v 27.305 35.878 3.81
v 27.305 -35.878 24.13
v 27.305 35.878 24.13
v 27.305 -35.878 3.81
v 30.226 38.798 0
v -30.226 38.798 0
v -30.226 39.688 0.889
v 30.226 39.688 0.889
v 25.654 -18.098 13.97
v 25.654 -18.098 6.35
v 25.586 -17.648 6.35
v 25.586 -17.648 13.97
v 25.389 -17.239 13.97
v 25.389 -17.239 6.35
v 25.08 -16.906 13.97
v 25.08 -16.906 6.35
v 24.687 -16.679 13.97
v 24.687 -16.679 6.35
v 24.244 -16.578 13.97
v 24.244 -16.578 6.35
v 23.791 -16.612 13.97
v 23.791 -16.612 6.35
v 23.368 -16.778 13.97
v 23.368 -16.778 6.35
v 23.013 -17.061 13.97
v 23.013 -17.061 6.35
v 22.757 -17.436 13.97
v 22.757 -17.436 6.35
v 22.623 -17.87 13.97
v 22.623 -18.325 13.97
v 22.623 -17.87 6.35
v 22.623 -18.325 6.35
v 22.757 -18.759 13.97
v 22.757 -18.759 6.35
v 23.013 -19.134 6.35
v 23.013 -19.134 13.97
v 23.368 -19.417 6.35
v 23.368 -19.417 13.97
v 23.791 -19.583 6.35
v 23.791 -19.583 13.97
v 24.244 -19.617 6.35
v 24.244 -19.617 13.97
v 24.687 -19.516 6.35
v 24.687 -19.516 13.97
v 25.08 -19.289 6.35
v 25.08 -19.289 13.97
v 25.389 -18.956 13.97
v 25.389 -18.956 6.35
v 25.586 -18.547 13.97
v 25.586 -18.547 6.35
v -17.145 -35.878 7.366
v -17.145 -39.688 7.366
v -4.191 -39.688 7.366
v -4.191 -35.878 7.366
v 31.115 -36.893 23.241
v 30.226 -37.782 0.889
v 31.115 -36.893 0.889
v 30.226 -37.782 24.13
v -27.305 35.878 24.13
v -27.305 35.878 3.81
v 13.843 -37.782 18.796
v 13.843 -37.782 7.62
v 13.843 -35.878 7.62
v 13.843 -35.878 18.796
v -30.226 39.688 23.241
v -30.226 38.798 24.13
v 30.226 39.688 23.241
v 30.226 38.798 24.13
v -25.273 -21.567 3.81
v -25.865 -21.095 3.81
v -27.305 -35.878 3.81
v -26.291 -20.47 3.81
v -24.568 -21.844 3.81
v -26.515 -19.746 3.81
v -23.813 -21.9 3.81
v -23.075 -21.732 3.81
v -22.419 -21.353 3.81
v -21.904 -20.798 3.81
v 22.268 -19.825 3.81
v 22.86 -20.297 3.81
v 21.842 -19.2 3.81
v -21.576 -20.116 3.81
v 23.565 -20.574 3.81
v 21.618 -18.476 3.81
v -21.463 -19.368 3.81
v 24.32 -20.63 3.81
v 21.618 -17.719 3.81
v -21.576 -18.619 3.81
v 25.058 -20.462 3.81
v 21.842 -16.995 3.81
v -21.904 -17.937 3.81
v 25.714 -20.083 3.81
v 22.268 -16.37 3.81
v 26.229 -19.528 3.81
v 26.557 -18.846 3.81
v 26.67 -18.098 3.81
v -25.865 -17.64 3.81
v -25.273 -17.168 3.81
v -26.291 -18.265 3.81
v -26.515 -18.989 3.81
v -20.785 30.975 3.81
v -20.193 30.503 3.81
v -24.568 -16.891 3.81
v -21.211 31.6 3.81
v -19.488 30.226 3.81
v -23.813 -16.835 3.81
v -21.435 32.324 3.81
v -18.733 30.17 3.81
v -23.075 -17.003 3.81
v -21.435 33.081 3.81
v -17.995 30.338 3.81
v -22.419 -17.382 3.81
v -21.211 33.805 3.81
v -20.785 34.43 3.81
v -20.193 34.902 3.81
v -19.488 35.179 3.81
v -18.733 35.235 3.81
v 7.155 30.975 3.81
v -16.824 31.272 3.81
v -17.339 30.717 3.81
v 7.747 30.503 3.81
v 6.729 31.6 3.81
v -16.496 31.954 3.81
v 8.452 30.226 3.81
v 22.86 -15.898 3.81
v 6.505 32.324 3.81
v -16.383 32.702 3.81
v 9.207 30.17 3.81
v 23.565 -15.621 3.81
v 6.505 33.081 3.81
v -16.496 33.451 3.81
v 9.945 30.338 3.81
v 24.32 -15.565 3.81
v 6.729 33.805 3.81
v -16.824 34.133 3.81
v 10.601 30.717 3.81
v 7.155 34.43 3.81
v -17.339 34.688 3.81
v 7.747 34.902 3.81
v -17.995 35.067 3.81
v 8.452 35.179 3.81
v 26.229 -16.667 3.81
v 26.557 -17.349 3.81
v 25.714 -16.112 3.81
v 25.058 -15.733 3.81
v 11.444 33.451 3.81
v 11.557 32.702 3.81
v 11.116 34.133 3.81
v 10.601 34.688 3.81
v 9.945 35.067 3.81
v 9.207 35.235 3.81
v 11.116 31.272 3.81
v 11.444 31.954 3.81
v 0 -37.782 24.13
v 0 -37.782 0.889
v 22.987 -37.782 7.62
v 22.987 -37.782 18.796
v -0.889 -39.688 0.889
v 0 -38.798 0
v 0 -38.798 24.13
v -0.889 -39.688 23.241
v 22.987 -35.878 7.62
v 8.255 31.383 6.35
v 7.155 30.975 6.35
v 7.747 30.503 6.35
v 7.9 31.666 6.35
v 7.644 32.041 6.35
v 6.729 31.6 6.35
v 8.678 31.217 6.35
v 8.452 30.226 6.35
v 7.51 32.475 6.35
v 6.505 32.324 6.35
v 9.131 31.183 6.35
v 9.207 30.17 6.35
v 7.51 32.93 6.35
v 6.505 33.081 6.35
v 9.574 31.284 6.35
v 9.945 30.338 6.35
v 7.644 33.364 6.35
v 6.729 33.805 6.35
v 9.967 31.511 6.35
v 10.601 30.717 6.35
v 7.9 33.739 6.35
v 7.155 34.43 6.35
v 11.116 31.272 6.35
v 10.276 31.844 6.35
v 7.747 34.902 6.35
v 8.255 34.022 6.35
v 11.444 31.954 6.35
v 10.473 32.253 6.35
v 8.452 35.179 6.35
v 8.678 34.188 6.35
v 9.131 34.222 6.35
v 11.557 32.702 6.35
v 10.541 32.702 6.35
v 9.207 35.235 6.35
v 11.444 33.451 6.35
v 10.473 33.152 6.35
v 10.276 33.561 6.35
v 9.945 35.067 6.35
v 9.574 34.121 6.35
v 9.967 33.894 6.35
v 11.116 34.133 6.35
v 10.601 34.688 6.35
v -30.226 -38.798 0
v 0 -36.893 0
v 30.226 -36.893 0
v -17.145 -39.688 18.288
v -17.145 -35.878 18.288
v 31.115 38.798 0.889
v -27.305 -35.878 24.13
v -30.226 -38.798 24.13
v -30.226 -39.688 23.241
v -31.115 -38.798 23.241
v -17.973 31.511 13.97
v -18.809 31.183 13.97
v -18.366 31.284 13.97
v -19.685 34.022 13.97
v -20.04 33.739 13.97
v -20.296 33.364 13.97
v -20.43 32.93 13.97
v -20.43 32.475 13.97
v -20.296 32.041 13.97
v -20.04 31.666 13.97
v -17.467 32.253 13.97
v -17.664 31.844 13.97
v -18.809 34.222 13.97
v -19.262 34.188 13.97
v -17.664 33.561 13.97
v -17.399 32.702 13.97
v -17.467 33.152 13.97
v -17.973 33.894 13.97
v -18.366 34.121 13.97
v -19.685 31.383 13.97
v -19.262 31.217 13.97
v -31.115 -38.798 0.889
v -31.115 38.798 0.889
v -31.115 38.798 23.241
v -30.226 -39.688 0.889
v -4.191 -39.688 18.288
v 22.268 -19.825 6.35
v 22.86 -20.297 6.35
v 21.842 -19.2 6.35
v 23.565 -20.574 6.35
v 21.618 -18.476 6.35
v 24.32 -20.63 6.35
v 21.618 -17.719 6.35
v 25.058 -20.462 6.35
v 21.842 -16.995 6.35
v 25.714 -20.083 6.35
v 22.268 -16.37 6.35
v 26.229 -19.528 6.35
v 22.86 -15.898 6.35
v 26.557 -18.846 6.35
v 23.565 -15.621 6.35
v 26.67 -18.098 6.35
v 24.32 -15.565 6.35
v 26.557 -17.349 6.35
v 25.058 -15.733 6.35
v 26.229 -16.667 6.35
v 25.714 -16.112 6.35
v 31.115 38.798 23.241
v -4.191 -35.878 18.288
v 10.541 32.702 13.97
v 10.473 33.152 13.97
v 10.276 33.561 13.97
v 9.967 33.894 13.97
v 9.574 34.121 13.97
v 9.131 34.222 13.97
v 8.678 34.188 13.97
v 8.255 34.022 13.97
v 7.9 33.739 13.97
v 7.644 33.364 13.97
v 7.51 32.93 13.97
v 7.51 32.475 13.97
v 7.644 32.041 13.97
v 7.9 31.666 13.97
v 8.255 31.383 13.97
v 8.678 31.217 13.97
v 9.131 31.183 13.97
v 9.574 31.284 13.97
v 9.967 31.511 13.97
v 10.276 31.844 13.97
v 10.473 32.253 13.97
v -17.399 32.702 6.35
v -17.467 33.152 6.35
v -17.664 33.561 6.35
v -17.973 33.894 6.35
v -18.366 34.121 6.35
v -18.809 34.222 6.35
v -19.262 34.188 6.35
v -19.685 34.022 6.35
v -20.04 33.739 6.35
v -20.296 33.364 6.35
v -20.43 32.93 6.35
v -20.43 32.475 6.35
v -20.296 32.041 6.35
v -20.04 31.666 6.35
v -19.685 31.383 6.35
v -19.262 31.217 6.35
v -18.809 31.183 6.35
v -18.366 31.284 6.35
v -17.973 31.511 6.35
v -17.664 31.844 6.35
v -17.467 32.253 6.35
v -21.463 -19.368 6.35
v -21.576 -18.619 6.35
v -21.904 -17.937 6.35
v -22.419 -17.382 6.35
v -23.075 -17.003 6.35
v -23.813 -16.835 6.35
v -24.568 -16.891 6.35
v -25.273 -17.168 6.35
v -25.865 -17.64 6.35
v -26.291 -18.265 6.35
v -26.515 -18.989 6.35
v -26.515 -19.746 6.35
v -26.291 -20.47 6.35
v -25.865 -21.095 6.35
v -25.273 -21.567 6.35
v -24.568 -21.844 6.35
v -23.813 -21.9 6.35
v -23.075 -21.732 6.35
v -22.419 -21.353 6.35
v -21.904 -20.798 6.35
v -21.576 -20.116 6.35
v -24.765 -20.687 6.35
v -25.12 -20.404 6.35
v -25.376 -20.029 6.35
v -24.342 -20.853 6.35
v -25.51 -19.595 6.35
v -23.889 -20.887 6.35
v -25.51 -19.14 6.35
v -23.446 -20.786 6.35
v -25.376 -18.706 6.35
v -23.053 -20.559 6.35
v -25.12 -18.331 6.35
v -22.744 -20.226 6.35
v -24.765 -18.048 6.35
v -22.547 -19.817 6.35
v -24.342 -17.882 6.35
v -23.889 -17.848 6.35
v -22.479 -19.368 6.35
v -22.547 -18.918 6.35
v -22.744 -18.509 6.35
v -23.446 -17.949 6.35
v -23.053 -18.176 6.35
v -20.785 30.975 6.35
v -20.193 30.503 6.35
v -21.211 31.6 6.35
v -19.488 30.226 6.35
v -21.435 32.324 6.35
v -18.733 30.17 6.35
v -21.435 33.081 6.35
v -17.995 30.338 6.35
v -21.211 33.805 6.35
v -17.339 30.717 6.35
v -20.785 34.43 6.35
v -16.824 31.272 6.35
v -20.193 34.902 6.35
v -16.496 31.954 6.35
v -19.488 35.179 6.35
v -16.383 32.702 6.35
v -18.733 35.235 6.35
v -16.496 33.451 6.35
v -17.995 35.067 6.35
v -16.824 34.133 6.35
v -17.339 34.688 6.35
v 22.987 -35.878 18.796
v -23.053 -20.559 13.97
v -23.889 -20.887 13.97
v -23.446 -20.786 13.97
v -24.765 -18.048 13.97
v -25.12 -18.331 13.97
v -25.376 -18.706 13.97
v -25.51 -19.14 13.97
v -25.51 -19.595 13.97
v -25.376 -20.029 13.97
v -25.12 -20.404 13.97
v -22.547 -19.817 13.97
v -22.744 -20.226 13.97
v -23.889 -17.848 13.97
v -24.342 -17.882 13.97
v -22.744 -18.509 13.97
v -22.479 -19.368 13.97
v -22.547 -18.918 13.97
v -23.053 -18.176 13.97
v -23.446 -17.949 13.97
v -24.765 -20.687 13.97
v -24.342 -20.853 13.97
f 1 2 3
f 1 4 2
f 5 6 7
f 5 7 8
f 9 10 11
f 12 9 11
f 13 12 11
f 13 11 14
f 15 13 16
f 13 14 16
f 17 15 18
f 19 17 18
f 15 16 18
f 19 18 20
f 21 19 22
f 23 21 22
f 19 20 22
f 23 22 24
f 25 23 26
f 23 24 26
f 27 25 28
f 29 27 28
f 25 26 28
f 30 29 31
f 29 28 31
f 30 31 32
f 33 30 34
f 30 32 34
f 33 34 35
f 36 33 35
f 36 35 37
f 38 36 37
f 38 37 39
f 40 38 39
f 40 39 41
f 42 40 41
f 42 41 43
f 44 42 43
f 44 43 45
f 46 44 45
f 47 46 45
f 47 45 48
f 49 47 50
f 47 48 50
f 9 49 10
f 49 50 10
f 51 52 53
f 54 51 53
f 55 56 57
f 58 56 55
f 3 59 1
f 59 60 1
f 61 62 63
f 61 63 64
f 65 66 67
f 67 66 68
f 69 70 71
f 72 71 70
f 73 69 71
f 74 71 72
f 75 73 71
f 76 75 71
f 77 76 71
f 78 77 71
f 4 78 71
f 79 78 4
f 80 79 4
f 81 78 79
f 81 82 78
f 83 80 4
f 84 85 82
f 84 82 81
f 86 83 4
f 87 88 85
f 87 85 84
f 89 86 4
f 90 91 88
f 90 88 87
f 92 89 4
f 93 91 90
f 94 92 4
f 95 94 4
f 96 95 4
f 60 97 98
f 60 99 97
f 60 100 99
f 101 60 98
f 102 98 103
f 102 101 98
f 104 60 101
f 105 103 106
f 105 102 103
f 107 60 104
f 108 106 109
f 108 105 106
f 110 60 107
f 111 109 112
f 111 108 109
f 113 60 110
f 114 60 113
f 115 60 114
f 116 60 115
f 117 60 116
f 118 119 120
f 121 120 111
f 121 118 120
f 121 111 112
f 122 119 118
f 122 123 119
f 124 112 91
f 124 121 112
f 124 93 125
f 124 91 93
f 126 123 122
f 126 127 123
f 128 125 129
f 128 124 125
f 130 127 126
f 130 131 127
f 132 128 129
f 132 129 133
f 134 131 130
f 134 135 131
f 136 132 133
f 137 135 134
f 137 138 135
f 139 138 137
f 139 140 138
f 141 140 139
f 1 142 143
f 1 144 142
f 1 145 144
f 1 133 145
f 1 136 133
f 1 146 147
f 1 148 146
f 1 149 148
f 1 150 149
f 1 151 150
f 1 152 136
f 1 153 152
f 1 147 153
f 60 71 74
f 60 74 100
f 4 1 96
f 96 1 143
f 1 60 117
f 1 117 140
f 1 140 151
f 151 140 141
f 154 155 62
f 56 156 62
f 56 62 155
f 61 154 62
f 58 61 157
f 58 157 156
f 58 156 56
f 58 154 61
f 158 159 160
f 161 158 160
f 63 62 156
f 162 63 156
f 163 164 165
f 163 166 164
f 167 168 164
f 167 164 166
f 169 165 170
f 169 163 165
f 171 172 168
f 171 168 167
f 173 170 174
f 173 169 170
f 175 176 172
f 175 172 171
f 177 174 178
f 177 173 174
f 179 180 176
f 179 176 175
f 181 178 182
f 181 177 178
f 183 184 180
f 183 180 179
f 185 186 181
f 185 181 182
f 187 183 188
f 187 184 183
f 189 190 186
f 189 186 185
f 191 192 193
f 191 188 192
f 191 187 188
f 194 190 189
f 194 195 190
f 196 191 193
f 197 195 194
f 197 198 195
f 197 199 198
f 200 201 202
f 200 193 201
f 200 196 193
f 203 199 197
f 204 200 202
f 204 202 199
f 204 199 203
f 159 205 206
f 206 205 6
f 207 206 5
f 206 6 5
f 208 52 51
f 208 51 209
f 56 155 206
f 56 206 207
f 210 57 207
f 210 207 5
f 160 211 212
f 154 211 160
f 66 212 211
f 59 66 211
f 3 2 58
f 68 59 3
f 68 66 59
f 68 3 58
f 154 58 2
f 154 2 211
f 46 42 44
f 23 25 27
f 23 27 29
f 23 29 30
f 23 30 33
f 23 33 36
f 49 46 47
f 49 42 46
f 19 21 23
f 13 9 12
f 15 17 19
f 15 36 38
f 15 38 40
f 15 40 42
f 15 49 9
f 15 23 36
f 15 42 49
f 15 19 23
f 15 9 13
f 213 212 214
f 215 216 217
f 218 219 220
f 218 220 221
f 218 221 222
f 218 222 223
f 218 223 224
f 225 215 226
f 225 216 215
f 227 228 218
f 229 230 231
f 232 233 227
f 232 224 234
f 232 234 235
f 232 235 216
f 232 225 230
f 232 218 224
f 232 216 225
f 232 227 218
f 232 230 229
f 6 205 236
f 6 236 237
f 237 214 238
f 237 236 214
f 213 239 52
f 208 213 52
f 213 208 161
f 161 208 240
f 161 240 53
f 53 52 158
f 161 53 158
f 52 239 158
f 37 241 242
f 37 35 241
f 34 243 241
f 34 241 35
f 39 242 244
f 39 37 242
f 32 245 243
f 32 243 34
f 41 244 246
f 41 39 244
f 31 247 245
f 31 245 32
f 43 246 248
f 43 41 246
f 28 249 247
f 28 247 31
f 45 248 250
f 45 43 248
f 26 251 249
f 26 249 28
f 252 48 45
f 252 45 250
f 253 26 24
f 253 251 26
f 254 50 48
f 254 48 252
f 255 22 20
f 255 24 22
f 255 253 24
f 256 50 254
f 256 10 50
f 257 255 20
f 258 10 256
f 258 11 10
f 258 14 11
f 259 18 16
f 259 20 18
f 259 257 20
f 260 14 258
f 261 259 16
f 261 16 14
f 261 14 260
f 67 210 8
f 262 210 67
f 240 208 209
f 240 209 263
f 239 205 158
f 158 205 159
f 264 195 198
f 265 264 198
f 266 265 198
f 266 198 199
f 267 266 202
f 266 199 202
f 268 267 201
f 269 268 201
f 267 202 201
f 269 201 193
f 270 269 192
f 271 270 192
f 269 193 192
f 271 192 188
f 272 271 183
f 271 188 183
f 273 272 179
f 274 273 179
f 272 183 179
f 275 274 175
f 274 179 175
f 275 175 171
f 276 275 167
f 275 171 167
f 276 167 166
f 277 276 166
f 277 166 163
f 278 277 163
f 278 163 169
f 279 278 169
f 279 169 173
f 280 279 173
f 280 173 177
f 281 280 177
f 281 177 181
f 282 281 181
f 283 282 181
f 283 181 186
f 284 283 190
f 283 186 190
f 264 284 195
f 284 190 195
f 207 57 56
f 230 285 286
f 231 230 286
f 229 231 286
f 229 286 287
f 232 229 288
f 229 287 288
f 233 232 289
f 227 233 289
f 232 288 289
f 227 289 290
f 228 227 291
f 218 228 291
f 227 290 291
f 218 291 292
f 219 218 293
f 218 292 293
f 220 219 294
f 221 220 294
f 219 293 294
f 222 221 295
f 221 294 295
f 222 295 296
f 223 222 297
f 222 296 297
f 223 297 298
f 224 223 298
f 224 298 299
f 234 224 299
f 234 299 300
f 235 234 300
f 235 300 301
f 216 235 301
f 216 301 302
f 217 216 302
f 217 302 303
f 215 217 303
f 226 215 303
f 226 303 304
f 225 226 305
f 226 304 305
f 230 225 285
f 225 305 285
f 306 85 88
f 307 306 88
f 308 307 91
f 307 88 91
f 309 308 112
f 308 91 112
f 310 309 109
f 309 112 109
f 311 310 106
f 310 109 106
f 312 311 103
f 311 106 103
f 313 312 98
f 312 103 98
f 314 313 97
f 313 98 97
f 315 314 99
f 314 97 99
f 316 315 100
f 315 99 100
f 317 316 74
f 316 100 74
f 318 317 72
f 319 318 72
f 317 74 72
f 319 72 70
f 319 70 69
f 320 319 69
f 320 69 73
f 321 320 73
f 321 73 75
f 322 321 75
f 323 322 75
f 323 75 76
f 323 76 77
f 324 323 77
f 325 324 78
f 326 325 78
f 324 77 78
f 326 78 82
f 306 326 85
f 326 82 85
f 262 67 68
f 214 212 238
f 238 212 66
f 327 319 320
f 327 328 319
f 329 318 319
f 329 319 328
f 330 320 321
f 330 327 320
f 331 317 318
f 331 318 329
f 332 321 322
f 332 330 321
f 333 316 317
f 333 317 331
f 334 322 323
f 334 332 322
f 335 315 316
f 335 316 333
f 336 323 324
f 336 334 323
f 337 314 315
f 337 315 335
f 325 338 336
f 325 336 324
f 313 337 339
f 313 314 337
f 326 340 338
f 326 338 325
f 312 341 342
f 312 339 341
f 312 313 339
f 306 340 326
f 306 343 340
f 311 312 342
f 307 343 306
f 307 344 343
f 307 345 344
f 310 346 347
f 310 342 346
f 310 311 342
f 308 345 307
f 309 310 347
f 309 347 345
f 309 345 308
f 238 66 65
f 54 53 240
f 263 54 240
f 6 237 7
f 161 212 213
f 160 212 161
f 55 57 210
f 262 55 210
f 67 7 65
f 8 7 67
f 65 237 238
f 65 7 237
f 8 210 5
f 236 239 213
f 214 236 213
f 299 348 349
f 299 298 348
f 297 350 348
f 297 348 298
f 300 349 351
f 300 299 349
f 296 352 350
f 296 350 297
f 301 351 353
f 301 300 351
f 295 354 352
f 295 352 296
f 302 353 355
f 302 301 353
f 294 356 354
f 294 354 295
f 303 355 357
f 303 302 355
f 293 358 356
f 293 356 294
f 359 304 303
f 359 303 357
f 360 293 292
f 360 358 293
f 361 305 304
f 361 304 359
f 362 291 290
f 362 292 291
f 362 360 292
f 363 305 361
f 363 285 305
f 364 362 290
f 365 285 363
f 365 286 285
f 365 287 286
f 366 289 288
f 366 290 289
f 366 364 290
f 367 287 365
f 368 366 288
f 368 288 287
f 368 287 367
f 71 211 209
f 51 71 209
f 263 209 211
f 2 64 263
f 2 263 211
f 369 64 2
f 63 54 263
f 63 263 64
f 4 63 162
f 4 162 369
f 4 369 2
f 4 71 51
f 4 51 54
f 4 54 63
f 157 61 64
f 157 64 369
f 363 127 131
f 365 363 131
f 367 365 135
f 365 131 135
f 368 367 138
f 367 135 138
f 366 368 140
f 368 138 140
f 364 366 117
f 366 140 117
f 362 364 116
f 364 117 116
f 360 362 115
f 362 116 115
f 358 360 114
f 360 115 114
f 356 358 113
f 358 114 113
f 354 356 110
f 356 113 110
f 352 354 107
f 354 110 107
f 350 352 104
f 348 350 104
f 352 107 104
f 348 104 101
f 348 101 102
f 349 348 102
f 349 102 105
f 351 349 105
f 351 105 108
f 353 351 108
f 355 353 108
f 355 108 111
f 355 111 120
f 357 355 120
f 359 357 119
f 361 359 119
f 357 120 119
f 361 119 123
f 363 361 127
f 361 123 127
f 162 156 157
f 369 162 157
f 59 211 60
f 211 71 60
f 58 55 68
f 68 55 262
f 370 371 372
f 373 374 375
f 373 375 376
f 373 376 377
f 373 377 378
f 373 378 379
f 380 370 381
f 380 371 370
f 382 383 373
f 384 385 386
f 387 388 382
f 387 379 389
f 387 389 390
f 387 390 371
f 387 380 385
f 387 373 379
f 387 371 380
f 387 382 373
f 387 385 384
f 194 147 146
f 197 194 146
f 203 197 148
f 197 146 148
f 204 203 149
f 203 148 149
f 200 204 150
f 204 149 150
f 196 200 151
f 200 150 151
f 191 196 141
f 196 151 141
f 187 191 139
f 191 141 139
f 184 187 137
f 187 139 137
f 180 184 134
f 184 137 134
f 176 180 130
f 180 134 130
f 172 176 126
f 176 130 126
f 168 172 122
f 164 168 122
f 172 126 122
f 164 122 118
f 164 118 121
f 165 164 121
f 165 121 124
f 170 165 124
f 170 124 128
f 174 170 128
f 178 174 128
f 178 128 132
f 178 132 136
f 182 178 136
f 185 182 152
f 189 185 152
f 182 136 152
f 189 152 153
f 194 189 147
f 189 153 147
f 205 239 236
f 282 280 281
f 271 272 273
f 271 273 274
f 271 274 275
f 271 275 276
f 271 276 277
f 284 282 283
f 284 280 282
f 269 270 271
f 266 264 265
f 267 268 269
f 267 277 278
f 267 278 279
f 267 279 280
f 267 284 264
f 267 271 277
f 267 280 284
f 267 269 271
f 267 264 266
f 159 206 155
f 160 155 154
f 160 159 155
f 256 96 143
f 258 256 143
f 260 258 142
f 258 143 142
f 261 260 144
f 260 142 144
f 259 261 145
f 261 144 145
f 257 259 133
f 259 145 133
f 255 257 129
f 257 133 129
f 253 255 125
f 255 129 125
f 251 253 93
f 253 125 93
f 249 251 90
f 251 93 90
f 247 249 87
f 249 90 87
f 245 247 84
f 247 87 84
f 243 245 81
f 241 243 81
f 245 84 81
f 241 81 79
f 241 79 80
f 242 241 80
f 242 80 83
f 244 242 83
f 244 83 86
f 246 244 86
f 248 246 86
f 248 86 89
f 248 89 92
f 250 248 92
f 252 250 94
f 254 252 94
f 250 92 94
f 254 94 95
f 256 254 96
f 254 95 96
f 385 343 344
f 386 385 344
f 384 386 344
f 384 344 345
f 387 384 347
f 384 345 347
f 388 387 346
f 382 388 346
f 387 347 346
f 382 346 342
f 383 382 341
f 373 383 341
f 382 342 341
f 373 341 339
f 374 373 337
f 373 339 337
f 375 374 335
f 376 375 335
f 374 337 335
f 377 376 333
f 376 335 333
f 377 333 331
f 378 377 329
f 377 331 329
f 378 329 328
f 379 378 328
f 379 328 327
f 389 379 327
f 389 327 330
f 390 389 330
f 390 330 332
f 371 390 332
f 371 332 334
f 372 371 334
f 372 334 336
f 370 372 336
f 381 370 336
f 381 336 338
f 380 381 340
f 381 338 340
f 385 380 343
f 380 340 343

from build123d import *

# Parameters (mm, degrees)
F0_W      = 62.23
F0_H      = 79.375
F1_DEPTH  = 24.13
F2_T      = -3.81
F4_R      = 2.54
F5_DEPTH  = 2.54
F7_R      = 1.524
F8_DEPTH  = 7.62
F9_W      = 12.954
F9_H      = 10.922
F9_W_2    = 9.144
F9_H_2    = 11.176
F10_DEPTH = 3.81
F11_W     = 31.115
F11_H     = 24.13
F12_DEPTH = 1.905
F13_SIZE  = 0.889


with BuildPart() as f1:
    # F0 (on Top) → F1 (new body)
    with BuildSketch(Plane.XY):
        Rectangle(F0_W, F0_H)
    extrude(amount=F1_DEPTH)

    # F2
    f2_openings = [f1.faces().sort_by_distance(p)[0] for p in [
        (0, 0, 24.13),
    ]]
    offset(amount=F2_T, openings=f2_openings)

    # F4 (on face) → F5 (join)
    with BuildSketch(Plane.XY.offset(3.81)):
        with Locations((9.017, 32.7025)):
            Circle(F4_R)
        with Locations((-18.923, 32.7025)):
            Circle(F4_R)
        with Locations((-24.003, -19.3675)):
            Circle(F4_R)
        with Locations((24.13, -18.0975)):
            Circle(F4_R)
    extrude(amount=F5_DEPTH)

    # F7 (on offset) → F8 (join)
    with BuildSketch(Plane.XY.offset(6.35)):
        with Locations((9.017, 32.7025)):
            Circle(F7_R)
        with Locations((-18.923, 32.7025)):
            Circle(F7_R)
        with Locations((-24.003, -19.3675)):
            Circle(F7_R)
        with Locations((24.13, -18.0975)):
            Circle(F7_R)
    extrude(amount=F8_DEPTH)

    # F9 (on face) → F10 (cut, through all)
    with BuildSketch(Plane.XZ.offset(39.6875)):
        with Locations((-10.668, 12.827)):
            Rectangle(F9_W, F9_H)
        with Locations((18.415, 13.208)):
            Rectangle(F9_W_2, F9_H_2)
    extrude(amount=-F10_DEPTH, mode=Mode.SUBTRACT)

    # F11 (on face) → F12 (cut)
    with BuildSketch(Plane.XZ.offset(39.6875)):
        with Locations((15.5575, 12.065)):
            Rectangle(F11_W, F11_H)
    extrude(amount=-F12_DEPTH, mode=Mode.SUBTRACT)

    # F13
    f13_edges = [f1.edges().sort_by_distance(p)[0] for p in [
        (-15.5575, -39.6875, 24.13),
        (-31.115, 0, 24.13),
        (0, 39.6875, 24.13),
        (31.115, 39.6875, 12.065),
        (31.115, 0.9525, 24.13),
        (31.115, -37.7825, 12.065),
        (31.115, 0.9525, 0),
        (15.5575, -37.7825, 0),
        (0, -39.6875, 12.065),
        (-15.5575, -39.6875, 0),
        (-31.115, -39.6875, 12.065),
        (-31.115, 39.6875, 12.065),
        (-31.115, 0, 0),
        (0, 39.6875, 0),
    ]]
    chamfer(f13_edges, length=F13_SIZE)


solid = f1.part
